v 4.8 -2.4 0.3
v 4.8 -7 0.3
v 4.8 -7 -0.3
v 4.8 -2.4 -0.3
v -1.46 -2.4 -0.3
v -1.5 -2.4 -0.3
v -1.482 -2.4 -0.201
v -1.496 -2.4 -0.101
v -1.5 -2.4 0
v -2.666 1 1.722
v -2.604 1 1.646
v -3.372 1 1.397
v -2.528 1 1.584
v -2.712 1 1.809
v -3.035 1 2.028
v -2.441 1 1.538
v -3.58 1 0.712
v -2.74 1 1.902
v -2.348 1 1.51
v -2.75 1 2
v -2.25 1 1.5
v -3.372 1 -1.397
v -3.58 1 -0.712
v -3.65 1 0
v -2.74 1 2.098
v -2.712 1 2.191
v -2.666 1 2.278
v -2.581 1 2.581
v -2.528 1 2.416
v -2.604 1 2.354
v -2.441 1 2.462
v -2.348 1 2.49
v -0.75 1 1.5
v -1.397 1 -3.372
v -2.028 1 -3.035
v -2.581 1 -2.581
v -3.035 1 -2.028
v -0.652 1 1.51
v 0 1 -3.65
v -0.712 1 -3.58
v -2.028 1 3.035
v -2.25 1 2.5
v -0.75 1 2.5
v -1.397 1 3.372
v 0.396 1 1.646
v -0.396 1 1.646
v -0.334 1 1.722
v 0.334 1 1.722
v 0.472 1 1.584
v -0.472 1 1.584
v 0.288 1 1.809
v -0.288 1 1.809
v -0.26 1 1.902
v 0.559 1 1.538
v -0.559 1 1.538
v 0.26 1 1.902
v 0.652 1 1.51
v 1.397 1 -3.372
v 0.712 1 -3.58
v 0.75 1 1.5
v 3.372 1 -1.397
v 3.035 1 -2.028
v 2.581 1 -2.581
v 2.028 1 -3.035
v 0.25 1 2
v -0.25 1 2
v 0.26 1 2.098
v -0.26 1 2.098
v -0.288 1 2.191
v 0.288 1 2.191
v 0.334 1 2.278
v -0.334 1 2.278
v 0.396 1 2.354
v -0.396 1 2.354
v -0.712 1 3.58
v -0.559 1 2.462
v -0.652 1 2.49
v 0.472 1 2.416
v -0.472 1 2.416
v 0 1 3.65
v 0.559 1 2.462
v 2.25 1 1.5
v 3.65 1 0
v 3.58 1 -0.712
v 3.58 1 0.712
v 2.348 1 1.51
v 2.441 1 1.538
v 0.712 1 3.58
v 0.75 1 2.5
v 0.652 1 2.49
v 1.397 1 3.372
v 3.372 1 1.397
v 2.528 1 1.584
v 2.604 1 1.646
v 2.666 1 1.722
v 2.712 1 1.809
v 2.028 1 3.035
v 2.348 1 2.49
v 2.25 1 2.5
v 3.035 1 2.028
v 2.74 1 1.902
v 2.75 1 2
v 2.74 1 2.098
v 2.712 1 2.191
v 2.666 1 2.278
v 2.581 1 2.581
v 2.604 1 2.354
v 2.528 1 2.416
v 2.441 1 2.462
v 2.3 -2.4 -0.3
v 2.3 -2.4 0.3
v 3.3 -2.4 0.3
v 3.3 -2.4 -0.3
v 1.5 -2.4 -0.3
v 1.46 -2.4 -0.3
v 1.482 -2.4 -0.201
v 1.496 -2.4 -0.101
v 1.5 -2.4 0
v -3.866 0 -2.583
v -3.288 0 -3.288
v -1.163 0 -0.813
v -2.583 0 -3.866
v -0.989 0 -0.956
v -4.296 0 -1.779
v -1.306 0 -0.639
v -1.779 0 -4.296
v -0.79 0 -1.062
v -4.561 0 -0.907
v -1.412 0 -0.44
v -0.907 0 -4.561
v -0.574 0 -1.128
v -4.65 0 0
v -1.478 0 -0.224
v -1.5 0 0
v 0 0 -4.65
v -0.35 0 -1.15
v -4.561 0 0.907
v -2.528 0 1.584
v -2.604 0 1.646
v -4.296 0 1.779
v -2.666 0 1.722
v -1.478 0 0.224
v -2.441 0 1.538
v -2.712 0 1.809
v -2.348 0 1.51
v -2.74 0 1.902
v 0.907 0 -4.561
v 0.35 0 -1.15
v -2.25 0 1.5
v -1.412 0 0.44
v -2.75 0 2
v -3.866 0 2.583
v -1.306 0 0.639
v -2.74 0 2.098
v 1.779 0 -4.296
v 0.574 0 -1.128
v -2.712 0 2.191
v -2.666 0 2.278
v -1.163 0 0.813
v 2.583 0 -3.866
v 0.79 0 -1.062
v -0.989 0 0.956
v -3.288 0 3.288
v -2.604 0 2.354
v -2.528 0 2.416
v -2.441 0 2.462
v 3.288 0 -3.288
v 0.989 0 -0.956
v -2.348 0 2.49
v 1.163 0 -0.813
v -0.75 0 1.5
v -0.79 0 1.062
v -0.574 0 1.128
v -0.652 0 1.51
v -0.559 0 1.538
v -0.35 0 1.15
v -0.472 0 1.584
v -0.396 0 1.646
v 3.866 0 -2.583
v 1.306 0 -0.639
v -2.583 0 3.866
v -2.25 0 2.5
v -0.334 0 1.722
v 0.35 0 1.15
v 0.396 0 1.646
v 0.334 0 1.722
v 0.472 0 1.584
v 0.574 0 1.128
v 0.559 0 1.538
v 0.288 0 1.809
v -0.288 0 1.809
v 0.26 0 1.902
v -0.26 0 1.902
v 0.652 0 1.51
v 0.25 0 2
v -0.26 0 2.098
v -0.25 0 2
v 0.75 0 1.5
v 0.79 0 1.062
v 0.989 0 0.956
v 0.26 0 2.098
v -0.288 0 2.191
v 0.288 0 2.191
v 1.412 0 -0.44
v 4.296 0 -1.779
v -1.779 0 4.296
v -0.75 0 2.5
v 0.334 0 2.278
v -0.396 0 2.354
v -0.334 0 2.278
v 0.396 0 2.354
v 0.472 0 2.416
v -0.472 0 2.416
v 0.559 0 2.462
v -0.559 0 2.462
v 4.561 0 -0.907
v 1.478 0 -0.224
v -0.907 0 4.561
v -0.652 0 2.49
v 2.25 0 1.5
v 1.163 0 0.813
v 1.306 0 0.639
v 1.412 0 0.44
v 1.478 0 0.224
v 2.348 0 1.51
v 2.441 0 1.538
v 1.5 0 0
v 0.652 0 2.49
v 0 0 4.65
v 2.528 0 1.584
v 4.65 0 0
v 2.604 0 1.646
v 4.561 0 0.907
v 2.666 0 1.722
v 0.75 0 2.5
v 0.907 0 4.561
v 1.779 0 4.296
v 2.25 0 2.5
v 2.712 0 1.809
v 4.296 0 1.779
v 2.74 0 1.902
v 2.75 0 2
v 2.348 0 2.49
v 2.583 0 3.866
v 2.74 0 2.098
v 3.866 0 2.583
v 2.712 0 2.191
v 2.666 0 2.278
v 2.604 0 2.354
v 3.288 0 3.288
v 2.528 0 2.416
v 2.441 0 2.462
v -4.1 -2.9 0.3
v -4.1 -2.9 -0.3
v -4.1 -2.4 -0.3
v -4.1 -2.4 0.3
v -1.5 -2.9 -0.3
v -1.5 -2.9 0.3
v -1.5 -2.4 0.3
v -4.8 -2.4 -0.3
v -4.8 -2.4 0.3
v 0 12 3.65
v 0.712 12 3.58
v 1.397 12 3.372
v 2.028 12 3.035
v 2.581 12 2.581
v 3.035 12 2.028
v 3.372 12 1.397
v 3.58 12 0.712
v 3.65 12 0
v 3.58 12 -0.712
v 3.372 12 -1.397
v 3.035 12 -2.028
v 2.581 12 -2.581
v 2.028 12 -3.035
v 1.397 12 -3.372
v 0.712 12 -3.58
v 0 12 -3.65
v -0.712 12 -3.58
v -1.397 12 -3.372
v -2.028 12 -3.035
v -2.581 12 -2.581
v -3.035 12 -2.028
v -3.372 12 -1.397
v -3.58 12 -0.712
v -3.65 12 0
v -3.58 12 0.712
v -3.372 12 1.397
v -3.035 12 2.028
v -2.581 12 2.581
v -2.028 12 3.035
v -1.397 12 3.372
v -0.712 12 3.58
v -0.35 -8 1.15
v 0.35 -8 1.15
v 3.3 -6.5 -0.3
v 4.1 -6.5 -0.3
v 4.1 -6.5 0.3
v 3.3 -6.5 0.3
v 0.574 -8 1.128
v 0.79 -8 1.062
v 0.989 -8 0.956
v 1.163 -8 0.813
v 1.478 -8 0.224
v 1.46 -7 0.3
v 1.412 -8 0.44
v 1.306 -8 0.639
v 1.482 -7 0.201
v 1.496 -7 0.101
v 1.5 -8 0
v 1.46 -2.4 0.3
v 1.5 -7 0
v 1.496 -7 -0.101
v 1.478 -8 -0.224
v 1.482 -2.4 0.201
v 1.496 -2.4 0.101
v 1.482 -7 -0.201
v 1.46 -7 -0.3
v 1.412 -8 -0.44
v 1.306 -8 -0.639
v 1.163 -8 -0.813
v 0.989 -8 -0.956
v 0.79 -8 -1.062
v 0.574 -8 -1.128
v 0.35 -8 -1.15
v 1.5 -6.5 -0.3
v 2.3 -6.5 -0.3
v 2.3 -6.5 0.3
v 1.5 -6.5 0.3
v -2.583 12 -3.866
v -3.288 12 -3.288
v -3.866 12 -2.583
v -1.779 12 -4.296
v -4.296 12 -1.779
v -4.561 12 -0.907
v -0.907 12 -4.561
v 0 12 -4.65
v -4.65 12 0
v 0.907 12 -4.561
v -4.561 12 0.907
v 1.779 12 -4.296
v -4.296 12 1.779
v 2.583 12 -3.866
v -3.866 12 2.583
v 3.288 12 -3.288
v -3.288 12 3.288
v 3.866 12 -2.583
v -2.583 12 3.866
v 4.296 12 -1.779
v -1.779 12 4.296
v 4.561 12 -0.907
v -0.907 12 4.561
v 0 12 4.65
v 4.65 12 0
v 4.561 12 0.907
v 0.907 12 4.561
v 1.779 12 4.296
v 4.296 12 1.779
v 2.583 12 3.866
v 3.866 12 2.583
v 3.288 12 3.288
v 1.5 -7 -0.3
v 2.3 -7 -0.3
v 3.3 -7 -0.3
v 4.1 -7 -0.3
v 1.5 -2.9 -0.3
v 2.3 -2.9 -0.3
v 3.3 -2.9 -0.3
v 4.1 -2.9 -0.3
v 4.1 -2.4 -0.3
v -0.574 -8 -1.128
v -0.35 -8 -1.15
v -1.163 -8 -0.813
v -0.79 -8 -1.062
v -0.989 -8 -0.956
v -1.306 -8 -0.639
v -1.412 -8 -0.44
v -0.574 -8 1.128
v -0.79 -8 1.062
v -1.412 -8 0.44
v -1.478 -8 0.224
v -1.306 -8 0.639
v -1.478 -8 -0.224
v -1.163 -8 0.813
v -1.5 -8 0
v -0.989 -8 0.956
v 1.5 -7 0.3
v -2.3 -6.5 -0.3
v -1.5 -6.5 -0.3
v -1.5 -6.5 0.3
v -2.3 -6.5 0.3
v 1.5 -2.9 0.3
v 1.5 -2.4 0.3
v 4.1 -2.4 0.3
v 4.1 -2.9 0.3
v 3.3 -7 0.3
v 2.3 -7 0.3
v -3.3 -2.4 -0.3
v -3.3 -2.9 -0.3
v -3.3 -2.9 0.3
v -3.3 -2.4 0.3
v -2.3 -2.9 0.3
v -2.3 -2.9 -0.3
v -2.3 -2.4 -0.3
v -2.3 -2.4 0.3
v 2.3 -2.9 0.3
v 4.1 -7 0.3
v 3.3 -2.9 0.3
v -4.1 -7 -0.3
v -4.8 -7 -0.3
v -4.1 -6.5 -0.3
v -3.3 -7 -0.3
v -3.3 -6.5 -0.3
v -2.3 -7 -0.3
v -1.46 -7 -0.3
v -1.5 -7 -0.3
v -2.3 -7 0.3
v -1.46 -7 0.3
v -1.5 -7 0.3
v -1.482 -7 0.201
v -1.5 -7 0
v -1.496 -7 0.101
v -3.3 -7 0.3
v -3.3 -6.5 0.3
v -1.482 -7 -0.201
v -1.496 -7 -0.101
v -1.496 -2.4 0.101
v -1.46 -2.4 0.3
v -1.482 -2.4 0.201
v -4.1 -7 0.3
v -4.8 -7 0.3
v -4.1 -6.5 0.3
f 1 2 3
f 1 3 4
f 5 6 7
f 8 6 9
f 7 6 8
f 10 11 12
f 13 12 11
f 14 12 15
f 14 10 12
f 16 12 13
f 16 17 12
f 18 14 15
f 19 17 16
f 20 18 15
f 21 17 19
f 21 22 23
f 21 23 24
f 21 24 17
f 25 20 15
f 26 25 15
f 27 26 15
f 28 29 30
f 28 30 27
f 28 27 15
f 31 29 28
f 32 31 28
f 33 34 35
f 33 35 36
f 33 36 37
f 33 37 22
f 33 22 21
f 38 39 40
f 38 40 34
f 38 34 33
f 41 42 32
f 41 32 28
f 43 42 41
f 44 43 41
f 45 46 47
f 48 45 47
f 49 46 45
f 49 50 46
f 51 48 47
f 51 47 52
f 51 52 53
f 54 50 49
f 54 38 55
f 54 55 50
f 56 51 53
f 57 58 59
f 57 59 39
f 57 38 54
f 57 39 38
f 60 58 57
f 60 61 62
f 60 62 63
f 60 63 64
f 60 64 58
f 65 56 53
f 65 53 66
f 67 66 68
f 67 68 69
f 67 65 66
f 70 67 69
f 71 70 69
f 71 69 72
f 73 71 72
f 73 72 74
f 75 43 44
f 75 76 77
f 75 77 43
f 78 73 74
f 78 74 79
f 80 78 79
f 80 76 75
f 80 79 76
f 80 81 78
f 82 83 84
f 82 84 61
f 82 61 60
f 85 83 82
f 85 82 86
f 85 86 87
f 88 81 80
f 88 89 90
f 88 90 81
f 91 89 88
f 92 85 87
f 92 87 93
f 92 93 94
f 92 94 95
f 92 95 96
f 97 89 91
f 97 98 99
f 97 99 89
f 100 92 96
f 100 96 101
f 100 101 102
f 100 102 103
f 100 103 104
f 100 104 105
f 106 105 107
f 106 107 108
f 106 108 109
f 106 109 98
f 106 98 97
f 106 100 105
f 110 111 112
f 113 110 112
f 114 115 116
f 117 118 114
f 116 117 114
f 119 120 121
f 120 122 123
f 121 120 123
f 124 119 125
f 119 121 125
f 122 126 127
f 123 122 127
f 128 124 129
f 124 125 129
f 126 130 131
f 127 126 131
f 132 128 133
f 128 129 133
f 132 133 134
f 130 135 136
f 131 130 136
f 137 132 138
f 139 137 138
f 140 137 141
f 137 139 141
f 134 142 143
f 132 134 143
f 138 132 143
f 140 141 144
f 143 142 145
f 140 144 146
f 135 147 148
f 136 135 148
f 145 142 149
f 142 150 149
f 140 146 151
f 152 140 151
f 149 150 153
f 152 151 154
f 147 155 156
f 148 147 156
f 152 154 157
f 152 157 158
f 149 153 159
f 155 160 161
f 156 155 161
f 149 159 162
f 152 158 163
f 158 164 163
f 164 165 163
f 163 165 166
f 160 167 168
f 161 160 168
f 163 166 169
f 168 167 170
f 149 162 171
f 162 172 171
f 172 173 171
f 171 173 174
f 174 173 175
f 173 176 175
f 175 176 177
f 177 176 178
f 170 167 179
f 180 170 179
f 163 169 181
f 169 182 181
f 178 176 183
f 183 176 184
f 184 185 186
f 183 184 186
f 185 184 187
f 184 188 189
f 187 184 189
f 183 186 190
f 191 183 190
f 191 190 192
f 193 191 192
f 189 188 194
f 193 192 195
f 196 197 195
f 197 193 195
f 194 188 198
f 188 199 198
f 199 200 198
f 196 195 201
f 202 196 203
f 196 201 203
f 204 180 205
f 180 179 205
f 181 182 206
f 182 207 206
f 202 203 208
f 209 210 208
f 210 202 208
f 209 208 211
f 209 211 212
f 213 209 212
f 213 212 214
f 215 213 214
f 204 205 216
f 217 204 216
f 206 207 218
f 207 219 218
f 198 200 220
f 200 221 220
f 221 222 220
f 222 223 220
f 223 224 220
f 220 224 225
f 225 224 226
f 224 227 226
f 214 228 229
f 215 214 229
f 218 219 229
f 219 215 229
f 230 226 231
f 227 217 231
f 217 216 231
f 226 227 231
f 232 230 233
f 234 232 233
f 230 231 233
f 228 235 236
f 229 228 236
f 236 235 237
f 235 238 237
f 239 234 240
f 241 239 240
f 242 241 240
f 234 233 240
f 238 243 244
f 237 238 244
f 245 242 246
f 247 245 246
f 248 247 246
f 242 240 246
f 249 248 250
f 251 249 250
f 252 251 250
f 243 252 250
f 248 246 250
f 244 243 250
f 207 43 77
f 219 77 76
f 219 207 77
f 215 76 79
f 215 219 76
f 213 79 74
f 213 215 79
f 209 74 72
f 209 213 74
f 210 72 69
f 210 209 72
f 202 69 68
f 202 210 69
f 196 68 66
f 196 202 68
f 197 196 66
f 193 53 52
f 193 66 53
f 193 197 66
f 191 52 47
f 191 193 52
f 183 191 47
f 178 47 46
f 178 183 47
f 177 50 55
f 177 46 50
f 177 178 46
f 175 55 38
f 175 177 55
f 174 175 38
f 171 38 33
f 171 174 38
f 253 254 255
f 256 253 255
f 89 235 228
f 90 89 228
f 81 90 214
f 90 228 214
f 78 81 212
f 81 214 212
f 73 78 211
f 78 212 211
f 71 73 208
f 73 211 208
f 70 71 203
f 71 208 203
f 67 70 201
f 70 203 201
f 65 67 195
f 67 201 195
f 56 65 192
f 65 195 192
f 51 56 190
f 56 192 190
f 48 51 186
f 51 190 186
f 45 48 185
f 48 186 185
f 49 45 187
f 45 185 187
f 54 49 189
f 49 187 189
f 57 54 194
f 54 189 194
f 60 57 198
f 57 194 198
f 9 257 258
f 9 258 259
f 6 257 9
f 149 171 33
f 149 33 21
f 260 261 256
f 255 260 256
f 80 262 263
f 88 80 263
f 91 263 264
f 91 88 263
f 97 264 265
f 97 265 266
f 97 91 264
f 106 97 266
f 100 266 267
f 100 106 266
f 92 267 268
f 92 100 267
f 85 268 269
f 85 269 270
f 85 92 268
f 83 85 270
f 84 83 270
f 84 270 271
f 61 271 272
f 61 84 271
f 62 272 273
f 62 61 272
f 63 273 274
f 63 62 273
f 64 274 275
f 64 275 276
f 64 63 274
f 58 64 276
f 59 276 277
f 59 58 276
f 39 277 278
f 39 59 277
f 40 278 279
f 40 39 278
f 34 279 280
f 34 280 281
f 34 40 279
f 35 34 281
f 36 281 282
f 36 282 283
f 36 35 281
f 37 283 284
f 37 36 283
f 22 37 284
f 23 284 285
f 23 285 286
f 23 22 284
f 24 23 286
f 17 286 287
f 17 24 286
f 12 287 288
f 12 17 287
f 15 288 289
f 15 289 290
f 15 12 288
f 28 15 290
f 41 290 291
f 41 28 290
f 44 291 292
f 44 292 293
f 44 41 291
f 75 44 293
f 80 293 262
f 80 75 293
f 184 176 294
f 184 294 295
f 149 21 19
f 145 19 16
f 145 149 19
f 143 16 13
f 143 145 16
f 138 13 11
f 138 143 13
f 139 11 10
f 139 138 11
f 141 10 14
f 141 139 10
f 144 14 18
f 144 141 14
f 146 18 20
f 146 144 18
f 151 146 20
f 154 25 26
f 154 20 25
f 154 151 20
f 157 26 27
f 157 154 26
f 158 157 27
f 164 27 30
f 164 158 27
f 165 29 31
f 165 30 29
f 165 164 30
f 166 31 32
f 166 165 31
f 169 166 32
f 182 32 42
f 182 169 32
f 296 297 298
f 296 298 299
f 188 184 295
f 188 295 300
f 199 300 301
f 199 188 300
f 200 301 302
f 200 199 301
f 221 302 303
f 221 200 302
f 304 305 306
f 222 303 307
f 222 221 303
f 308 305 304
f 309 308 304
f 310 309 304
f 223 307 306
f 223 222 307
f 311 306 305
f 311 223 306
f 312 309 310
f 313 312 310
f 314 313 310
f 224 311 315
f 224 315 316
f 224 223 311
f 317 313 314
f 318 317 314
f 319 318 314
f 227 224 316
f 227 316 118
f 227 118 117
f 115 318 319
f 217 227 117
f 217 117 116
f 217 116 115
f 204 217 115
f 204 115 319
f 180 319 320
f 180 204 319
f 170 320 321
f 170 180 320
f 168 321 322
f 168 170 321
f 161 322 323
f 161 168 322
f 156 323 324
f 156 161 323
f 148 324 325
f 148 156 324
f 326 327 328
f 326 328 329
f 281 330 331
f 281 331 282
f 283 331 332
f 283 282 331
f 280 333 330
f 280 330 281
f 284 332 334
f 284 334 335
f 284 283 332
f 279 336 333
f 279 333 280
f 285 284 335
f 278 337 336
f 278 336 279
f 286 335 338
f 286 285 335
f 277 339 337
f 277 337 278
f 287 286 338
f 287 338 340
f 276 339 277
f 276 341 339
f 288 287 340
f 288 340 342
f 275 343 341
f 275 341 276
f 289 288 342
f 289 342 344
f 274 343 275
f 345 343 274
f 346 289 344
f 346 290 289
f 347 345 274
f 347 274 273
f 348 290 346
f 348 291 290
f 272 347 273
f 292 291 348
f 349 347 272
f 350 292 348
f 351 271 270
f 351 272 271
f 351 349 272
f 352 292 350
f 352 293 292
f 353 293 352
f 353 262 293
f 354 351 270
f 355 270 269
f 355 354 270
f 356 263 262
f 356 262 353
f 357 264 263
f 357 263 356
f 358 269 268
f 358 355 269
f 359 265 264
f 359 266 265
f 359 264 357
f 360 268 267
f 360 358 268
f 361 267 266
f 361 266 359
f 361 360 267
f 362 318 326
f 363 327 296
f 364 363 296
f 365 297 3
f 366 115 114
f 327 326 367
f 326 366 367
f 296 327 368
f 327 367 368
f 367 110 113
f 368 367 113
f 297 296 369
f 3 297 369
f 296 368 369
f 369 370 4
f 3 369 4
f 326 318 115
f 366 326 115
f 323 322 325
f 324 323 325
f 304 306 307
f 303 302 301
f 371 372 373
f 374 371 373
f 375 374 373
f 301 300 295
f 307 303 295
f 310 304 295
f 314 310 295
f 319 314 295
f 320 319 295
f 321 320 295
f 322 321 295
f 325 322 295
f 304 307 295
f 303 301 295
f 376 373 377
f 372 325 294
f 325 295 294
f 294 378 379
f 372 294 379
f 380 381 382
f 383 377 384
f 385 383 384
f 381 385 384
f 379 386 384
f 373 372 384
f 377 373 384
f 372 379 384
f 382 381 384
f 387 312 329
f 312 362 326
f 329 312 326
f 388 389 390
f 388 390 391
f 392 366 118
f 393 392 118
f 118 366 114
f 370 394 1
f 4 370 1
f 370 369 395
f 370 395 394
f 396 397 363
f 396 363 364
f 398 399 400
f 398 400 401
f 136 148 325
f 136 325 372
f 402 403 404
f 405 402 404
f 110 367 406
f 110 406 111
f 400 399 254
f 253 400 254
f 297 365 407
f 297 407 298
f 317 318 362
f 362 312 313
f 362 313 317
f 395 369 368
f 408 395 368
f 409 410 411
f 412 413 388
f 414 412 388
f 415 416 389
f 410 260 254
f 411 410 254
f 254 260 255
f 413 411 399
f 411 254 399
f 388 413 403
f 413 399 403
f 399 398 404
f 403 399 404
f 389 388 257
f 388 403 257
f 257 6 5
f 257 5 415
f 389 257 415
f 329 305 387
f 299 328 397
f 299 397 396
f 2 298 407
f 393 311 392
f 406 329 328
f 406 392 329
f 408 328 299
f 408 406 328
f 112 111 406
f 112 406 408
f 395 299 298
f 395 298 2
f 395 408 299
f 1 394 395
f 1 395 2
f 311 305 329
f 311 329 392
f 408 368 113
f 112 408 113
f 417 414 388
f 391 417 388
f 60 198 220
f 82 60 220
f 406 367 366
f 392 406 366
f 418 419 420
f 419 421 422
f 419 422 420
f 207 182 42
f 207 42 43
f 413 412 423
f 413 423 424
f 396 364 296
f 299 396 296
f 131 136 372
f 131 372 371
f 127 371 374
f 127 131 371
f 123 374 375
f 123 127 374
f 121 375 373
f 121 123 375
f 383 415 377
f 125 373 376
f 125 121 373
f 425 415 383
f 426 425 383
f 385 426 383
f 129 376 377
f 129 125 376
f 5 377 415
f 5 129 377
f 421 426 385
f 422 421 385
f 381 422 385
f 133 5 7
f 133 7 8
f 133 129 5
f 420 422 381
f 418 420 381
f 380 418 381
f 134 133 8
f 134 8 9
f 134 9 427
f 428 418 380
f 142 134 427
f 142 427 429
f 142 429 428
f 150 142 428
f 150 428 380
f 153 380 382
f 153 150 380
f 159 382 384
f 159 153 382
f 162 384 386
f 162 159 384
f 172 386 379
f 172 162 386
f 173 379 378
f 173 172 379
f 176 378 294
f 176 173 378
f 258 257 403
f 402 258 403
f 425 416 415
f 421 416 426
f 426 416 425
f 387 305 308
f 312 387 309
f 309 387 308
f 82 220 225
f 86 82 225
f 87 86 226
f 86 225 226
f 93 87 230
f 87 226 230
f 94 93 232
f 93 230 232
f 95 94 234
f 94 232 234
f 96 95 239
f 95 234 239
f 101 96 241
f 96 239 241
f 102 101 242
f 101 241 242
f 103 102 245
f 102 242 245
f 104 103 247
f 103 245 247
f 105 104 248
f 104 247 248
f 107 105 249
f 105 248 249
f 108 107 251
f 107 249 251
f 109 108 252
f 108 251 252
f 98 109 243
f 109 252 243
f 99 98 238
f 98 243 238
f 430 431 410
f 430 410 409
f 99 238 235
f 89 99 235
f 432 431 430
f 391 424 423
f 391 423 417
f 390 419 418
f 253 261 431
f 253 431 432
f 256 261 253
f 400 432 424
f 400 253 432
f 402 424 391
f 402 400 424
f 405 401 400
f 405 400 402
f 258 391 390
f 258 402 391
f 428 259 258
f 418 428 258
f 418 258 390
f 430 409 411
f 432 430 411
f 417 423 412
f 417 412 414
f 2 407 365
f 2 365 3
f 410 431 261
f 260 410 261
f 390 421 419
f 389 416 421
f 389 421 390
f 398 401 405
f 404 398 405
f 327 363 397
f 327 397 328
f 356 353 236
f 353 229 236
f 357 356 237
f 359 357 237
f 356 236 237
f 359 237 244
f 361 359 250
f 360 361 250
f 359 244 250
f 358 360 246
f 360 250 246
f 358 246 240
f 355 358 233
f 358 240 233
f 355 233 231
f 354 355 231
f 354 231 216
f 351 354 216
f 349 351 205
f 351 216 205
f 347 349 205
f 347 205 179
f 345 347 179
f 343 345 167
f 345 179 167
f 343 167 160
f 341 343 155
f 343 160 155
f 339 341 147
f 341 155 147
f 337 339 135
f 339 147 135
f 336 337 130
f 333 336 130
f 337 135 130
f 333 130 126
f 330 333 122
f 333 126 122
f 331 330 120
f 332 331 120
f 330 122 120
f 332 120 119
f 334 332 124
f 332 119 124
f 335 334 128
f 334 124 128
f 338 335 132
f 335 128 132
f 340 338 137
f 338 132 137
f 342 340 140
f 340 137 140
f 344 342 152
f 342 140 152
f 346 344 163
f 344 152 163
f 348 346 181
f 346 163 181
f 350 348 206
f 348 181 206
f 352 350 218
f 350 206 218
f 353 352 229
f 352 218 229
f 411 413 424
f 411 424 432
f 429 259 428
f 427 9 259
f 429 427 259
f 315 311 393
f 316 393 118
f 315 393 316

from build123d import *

# Parameters (mm, degrees)
SKETCH1_R           = 4.65
BOSS_EXTRUDE1_DEPTH = 1
SKETCH2_R           = 4.65
SKETCH2_R_2         = 3.65
BOSS_EXTRUDE2_DEPTH = 11
BOSS_EXTRUDE3_DEPTH = 8
SKETCH4_W           = 9.6
SKETCH4_H           = 4.6
BOSS_EXTRUDE4_DEPTH = 0.3
SKETCH5_W           = 0.8
SKETCH5_H           = 0.5
CUT_EXTRUDE1_DEPTH  = 14.839888005
CUT_EXTRUDE2_DEPTH  = 14.735446844


with BuildPart() as part:
    # Sketch1 → Boss-Extrude1 (new body)
    with BuildSketch(Plane(origin=(0, 0, 0), x_dir=(1, 0, 0), z_dir=(0, 1, 0))):
        with Locations(Location((0, 0, 0), (0, 0, 270))):
            Circle(SKETCH1_R)
    extrude(amount=BOSS_EXTRUDE1_DEPTH)

    # Sketch2 → Boss-Extrude2 (add)
    with BuildSketch(Plane(origin=(0, 1, 0), x_dir=(1, 0, 0), z_dir=(0, 1, 0))):
        with Locations(Location((0, 0, 0), (0, 0, 270))):
            Circle(SKETCH2_R)
        with Locations(Location((0, 0, 0), (0, 0, 270))):
            Circle(SKETCH2_R_2, mode=Mode.SUBTRACT)
    extrude(amount=BOSS_EXTRUDE2_DEPTH)

    # Sketch3 → Boss-Extrude3 (add)
    with BuildSketch(Plane.XZ):
        with BuildLine():
            Line((0.35, -1.15), (-0.35, -1.15))
            ThreePointArc((-0.35, -1.15), (-1.5, 0), (-0.35, 1.15))
            Line((-0.35, 1.15), (0.35, 1.15))
            ThreePointArc((0.35, 1.15), (1.5, 0), (0.35, -1.15))
        make_face()
    extrude(amount=BOSS_EXTRUDE3_DEPTH)

    # Sketch4 → Boss-Extrude4 (add, symmetric)
    with BuildSketch(Plane.XY):
        with Locations((0, -4.7)):
            Rectangle(SKETCH4_W, SKETCH4_H)
    extrude(amount=BOSS_EXTRUDE4_DEPTH, both=True)

    # Sketch5 → Cut-Extrude1 (cut, through all)
    with BuildSketch(Plane(origin=(0, 0, -0.3), x_dir=(-1, 0, 0), z_dir=(0, 0, -1))):
        with Locations((-1.9, -2.65)):
            Rectangle(SKETCH5_W, SKETCH5_H)
        with Locations((-3.7, -2.65)):
            Rectangle(SKETCH5_W, SKETCH5_H)
        with Locations((3.7, -2.65)):
            Rectangle(SKETCH5_W, SKETCH5_H)
        with Locations((1.9, -2.65)):
            Rectangle(SKETCH5_W, SKETCH5_H)
        with Locations((1.9, -6.75)):
            Rectangle(SKETCH5_W, SKETCH5_H)
        with Locations((3.7, -6.75)):
            Rectangle(SKETCH5_W, SKETCH5_H)
        with Locations((-3.7, -6.75)):
            Rectangle(SKETCH5_W, SKETCH5_H)
        with Locations((-1.9, -6.75)):
            Rectangle(SKETCH5_W, SKETCH5_H)
    extrude(amount=-CUT_EXTRUDE1_DEPTH, mode=Mode.SUBTRACT)

    # Sketch6 → Cut-Extrude2 (cut, through all)
    with BuildSketch(Plane.XZ):
        with BuildLine():
            Line((-0.75, 1.5), (-2.25, 1.5))
            ThreePointArc((-2.25, 1.5), (-2.75, 2), (-2.25, 2.5))
            Line((-2.25, 2.5), (-0.75, 2.5))
            ThreePointArc((-0.75, 2.5), (-0.25, 2), (-0.75, 1.5))
        make_face()
        with BuildLine():
            Line((0.75, 1.5), (2.25, 1.5))
            ThreePointArc((2.25, 1.5), (2.75, 2), (2.25, 2.5))
            Line((2.25, 2.5), (0.75, 2.5))
            ThreePointArc((0.75, 2.5), (0.25, 2), (0.75, 1.5))
        make_face()
    extrude(amount=-CUT_EXTRUDE2_DEPTH, mode=Mode.SUBTRACT)


solid = part.part
